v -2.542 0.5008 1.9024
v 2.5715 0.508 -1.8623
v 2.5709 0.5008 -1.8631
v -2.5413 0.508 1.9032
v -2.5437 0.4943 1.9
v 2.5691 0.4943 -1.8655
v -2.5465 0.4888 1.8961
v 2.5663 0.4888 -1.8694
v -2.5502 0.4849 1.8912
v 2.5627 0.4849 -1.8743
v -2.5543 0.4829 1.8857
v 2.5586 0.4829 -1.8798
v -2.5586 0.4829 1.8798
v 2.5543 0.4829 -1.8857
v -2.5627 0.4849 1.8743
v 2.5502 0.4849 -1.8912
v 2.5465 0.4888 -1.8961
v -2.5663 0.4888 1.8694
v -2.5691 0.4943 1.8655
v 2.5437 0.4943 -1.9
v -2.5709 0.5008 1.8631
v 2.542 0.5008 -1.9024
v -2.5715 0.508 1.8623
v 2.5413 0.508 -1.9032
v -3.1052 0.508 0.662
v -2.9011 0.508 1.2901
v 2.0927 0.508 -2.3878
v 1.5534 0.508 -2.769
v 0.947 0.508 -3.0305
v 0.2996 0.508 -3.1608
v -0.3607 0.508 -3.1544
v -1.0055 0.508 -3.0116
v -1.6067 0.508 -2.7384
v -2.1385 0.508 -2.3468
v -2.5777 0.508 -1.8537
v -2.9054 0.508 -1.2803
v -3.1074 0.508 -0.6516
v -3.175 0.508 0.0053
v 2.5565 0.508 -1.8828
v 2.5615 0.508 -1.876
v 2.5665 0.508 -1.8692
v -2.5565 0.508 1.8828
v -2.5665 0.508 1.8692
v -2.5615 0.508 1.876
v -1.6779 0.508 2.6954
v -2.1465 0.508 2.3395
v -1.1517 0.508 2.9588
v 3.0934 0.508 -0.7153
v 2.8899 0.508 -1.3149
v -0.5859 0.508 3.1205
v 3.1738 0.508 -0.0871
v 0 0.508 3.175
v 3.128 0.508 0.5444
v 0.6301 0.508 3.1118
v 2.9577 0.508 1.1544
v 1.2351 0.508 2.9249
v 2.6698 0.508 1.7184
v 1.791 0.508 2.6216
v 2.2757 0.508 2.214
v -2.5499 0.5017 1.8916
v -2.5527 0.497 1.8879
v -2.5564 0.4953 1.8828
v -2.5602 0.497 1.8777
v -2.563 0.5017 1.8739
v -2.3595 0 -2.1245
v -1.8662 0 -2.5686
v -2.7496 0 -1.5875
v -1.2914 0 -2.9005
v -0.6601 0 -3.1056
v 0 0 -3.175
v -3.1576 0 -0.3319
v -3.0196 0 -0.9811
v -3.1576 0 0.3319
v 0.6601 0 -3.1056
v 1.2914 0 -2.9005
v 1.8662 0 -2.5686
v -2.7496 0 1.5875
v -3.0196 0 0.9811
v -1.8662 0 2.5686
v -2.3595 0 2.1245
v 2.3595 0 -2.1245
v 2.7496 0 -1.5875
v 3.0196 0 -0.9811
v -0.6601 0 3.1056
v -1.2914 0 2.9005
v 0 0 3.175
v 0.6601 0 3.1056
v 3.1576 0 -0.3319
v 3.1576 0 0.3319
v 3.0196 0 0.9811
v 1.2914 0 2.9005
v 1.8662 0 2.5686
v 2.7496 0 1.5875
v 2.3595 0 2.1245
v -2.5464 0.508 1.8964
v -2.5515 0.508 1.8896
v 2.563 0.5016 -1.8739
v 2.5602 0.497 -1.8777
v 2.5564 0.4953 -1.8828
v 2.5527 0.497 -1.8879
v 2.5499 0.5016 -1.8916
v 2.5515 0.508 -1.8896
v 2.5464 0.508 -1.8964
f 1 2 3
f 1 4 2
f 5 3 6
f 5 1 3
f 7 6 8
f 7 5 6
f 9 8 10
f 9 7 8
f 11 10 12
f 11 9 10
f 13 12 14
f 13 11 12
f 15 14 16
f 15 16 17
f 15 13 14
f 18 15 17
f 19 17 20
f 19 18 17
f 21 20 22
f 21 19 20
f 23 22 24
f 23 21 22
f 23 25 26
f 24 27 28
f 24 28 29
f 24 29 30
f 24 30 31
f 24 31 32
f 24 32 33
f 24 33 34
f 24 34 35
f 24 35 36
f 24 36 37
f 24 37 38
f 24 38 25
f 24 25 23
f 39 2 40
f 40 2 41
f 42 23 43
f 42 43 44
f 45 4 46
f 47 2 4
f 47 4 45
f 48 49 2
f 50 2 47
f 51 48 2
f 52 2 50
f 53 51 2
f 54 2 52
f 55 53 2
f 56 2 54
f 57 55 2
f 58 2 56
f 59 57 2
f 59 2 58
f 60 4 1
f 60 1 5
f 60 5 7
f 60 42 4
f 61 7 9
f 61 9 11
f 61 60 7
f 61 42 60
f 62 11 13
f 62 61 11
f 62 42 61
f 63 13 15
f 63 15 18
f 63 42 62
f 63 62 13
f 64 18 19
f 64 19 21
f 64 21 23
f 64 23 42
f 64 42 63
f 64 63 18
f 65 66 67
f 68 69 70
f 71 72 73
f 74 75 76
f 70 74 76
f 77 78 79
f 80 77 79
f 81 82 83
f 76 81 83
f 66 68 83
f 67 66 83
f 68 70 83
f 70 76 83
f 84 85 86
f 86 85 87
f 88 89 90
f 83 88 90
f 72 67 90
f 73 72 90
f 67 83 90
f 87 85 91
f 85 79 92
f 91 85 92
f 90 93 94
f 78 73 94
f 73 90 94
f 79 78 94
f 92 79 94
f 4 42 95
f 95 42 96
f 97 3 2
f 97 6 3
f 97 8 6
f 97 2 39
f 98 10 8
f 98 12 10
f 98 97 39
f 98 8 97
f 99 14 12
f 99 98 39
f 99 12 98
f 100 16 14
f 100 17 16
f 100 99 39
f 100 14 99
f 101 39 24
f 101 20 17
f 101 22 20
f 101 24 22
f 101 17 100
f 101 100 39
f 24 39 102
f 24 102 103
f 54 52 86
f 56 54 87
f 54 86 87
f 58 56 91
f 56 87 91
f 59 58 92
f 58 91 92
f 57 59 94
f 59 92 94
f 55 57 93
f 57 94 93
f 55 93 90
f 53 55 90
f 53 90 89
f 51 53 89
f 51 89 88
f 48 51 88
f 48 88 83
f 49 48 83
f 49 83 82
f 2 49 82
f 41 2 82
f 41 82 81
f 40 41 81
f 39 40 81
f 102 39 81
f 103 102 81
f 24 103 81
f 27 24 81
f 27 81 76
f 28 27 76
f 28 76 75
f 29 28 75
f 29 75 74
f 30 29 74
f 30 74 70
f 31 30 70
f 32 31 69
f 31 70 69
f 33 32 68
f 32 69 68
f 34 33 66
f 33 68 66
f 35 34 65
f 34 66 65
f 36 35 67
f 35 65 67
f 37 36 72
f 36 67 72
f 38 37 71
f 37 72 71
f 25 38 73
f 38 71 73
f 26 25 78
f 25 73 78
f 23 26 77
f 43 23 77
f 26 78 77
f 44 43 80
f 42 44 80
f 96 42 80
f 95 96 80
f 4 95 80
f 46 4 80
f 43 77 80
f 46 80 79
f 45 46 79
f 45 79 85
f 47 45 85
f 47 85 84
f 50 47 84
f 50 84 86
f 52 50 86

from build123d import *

# Parameters (mm, degrees)
SKETCH1_R           = 3.175
BOSS_EXTRUDE1_DEPTH = 0.508
CUT_REVOLVE1_ANGLE  = 180


with BuildPart() as part:
    # Sketch1 → Boss-Extrude1 (new body)
    with BuildSketch(Plane(origin=(0, 0, 0), x_dir=(1, 0, 0), z_dir=(0, 1, 0))):
        with Locations(Location((0, 0, 0), (0, 0, 270))):
            Circle(SKETCH1_R)
    extrude(amount=BOSS_EXTRUDE1_DEPTH)

    # Sketch2 → Cut-Revolve1 (revolve, cut)
    with BuildSketch(Plane(origin=(0, 0.508, 0), x_dir=(1, 0, 0), z_dir=(0, 1, 0))):
        Polygon((-2.556490895, -1.882811542), (2.556490895, 1.882811542), (2.571471578, 1.862299364), (-2.541346594, -1.903203218), align=None)
    revolve(axis=Axis((-2.556490895, 0.508, 1.882811542), (0.8051939826990212, 0, -0.5930115093531394)), revolution_arc=CUT_REVOLVE1_ANGLE, mode=Mode.SUBTRACT)


solid = part.part
